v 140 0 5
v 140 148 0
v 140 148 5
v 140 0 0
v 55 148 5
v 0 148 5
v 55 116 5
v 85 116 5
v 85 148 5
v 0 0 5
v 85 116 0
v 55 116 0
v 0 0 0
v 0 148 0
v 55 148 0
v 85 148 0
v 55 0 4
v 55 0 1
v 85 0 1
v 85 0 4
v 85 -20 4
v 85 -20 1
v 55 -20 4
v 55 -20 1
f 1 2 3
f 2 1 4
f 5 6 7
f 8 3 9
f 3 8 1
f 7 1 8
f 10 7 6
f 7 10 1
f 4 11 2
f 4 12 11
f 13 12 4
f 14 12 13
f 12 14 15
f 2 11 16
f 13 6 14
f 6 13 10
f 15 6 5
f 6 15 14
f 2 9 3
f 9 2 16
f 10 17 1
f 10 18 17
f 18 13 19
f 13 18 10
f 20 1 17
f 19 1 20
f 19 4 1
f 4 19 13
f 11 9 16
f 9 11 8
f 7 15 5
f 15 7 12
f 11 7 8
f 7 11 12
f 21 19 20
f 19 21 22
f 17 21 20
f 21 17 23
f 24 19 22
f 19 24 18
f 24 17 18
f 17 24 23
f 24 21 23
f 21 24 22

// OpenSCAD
/*
        ENAMEL PROJECT - MELANIE BALJKO
        MODELLING FOR VERSION 2
        CREATED BY: SHWETA DIXIT - 2017

        TITLE --- VERSION 2 - SLIDER TO SEPARATE BOX IN TWO LAYERS

        (Measurements in mm)

*/

// Modelling the slider to separate the box in two layers
module slider_layer()
{

    difference()
    {
        cube([140, 148, 5]);

        // Adding the hole to let wires through
        translate([55, 116, 0])
        {
            cube([30, 32, 5]);
        }
    }

    // Adding the handle
    translate([55, -20, 1])
    {
        cube([30, 20, 3]);
    }
}
slider_layer();
